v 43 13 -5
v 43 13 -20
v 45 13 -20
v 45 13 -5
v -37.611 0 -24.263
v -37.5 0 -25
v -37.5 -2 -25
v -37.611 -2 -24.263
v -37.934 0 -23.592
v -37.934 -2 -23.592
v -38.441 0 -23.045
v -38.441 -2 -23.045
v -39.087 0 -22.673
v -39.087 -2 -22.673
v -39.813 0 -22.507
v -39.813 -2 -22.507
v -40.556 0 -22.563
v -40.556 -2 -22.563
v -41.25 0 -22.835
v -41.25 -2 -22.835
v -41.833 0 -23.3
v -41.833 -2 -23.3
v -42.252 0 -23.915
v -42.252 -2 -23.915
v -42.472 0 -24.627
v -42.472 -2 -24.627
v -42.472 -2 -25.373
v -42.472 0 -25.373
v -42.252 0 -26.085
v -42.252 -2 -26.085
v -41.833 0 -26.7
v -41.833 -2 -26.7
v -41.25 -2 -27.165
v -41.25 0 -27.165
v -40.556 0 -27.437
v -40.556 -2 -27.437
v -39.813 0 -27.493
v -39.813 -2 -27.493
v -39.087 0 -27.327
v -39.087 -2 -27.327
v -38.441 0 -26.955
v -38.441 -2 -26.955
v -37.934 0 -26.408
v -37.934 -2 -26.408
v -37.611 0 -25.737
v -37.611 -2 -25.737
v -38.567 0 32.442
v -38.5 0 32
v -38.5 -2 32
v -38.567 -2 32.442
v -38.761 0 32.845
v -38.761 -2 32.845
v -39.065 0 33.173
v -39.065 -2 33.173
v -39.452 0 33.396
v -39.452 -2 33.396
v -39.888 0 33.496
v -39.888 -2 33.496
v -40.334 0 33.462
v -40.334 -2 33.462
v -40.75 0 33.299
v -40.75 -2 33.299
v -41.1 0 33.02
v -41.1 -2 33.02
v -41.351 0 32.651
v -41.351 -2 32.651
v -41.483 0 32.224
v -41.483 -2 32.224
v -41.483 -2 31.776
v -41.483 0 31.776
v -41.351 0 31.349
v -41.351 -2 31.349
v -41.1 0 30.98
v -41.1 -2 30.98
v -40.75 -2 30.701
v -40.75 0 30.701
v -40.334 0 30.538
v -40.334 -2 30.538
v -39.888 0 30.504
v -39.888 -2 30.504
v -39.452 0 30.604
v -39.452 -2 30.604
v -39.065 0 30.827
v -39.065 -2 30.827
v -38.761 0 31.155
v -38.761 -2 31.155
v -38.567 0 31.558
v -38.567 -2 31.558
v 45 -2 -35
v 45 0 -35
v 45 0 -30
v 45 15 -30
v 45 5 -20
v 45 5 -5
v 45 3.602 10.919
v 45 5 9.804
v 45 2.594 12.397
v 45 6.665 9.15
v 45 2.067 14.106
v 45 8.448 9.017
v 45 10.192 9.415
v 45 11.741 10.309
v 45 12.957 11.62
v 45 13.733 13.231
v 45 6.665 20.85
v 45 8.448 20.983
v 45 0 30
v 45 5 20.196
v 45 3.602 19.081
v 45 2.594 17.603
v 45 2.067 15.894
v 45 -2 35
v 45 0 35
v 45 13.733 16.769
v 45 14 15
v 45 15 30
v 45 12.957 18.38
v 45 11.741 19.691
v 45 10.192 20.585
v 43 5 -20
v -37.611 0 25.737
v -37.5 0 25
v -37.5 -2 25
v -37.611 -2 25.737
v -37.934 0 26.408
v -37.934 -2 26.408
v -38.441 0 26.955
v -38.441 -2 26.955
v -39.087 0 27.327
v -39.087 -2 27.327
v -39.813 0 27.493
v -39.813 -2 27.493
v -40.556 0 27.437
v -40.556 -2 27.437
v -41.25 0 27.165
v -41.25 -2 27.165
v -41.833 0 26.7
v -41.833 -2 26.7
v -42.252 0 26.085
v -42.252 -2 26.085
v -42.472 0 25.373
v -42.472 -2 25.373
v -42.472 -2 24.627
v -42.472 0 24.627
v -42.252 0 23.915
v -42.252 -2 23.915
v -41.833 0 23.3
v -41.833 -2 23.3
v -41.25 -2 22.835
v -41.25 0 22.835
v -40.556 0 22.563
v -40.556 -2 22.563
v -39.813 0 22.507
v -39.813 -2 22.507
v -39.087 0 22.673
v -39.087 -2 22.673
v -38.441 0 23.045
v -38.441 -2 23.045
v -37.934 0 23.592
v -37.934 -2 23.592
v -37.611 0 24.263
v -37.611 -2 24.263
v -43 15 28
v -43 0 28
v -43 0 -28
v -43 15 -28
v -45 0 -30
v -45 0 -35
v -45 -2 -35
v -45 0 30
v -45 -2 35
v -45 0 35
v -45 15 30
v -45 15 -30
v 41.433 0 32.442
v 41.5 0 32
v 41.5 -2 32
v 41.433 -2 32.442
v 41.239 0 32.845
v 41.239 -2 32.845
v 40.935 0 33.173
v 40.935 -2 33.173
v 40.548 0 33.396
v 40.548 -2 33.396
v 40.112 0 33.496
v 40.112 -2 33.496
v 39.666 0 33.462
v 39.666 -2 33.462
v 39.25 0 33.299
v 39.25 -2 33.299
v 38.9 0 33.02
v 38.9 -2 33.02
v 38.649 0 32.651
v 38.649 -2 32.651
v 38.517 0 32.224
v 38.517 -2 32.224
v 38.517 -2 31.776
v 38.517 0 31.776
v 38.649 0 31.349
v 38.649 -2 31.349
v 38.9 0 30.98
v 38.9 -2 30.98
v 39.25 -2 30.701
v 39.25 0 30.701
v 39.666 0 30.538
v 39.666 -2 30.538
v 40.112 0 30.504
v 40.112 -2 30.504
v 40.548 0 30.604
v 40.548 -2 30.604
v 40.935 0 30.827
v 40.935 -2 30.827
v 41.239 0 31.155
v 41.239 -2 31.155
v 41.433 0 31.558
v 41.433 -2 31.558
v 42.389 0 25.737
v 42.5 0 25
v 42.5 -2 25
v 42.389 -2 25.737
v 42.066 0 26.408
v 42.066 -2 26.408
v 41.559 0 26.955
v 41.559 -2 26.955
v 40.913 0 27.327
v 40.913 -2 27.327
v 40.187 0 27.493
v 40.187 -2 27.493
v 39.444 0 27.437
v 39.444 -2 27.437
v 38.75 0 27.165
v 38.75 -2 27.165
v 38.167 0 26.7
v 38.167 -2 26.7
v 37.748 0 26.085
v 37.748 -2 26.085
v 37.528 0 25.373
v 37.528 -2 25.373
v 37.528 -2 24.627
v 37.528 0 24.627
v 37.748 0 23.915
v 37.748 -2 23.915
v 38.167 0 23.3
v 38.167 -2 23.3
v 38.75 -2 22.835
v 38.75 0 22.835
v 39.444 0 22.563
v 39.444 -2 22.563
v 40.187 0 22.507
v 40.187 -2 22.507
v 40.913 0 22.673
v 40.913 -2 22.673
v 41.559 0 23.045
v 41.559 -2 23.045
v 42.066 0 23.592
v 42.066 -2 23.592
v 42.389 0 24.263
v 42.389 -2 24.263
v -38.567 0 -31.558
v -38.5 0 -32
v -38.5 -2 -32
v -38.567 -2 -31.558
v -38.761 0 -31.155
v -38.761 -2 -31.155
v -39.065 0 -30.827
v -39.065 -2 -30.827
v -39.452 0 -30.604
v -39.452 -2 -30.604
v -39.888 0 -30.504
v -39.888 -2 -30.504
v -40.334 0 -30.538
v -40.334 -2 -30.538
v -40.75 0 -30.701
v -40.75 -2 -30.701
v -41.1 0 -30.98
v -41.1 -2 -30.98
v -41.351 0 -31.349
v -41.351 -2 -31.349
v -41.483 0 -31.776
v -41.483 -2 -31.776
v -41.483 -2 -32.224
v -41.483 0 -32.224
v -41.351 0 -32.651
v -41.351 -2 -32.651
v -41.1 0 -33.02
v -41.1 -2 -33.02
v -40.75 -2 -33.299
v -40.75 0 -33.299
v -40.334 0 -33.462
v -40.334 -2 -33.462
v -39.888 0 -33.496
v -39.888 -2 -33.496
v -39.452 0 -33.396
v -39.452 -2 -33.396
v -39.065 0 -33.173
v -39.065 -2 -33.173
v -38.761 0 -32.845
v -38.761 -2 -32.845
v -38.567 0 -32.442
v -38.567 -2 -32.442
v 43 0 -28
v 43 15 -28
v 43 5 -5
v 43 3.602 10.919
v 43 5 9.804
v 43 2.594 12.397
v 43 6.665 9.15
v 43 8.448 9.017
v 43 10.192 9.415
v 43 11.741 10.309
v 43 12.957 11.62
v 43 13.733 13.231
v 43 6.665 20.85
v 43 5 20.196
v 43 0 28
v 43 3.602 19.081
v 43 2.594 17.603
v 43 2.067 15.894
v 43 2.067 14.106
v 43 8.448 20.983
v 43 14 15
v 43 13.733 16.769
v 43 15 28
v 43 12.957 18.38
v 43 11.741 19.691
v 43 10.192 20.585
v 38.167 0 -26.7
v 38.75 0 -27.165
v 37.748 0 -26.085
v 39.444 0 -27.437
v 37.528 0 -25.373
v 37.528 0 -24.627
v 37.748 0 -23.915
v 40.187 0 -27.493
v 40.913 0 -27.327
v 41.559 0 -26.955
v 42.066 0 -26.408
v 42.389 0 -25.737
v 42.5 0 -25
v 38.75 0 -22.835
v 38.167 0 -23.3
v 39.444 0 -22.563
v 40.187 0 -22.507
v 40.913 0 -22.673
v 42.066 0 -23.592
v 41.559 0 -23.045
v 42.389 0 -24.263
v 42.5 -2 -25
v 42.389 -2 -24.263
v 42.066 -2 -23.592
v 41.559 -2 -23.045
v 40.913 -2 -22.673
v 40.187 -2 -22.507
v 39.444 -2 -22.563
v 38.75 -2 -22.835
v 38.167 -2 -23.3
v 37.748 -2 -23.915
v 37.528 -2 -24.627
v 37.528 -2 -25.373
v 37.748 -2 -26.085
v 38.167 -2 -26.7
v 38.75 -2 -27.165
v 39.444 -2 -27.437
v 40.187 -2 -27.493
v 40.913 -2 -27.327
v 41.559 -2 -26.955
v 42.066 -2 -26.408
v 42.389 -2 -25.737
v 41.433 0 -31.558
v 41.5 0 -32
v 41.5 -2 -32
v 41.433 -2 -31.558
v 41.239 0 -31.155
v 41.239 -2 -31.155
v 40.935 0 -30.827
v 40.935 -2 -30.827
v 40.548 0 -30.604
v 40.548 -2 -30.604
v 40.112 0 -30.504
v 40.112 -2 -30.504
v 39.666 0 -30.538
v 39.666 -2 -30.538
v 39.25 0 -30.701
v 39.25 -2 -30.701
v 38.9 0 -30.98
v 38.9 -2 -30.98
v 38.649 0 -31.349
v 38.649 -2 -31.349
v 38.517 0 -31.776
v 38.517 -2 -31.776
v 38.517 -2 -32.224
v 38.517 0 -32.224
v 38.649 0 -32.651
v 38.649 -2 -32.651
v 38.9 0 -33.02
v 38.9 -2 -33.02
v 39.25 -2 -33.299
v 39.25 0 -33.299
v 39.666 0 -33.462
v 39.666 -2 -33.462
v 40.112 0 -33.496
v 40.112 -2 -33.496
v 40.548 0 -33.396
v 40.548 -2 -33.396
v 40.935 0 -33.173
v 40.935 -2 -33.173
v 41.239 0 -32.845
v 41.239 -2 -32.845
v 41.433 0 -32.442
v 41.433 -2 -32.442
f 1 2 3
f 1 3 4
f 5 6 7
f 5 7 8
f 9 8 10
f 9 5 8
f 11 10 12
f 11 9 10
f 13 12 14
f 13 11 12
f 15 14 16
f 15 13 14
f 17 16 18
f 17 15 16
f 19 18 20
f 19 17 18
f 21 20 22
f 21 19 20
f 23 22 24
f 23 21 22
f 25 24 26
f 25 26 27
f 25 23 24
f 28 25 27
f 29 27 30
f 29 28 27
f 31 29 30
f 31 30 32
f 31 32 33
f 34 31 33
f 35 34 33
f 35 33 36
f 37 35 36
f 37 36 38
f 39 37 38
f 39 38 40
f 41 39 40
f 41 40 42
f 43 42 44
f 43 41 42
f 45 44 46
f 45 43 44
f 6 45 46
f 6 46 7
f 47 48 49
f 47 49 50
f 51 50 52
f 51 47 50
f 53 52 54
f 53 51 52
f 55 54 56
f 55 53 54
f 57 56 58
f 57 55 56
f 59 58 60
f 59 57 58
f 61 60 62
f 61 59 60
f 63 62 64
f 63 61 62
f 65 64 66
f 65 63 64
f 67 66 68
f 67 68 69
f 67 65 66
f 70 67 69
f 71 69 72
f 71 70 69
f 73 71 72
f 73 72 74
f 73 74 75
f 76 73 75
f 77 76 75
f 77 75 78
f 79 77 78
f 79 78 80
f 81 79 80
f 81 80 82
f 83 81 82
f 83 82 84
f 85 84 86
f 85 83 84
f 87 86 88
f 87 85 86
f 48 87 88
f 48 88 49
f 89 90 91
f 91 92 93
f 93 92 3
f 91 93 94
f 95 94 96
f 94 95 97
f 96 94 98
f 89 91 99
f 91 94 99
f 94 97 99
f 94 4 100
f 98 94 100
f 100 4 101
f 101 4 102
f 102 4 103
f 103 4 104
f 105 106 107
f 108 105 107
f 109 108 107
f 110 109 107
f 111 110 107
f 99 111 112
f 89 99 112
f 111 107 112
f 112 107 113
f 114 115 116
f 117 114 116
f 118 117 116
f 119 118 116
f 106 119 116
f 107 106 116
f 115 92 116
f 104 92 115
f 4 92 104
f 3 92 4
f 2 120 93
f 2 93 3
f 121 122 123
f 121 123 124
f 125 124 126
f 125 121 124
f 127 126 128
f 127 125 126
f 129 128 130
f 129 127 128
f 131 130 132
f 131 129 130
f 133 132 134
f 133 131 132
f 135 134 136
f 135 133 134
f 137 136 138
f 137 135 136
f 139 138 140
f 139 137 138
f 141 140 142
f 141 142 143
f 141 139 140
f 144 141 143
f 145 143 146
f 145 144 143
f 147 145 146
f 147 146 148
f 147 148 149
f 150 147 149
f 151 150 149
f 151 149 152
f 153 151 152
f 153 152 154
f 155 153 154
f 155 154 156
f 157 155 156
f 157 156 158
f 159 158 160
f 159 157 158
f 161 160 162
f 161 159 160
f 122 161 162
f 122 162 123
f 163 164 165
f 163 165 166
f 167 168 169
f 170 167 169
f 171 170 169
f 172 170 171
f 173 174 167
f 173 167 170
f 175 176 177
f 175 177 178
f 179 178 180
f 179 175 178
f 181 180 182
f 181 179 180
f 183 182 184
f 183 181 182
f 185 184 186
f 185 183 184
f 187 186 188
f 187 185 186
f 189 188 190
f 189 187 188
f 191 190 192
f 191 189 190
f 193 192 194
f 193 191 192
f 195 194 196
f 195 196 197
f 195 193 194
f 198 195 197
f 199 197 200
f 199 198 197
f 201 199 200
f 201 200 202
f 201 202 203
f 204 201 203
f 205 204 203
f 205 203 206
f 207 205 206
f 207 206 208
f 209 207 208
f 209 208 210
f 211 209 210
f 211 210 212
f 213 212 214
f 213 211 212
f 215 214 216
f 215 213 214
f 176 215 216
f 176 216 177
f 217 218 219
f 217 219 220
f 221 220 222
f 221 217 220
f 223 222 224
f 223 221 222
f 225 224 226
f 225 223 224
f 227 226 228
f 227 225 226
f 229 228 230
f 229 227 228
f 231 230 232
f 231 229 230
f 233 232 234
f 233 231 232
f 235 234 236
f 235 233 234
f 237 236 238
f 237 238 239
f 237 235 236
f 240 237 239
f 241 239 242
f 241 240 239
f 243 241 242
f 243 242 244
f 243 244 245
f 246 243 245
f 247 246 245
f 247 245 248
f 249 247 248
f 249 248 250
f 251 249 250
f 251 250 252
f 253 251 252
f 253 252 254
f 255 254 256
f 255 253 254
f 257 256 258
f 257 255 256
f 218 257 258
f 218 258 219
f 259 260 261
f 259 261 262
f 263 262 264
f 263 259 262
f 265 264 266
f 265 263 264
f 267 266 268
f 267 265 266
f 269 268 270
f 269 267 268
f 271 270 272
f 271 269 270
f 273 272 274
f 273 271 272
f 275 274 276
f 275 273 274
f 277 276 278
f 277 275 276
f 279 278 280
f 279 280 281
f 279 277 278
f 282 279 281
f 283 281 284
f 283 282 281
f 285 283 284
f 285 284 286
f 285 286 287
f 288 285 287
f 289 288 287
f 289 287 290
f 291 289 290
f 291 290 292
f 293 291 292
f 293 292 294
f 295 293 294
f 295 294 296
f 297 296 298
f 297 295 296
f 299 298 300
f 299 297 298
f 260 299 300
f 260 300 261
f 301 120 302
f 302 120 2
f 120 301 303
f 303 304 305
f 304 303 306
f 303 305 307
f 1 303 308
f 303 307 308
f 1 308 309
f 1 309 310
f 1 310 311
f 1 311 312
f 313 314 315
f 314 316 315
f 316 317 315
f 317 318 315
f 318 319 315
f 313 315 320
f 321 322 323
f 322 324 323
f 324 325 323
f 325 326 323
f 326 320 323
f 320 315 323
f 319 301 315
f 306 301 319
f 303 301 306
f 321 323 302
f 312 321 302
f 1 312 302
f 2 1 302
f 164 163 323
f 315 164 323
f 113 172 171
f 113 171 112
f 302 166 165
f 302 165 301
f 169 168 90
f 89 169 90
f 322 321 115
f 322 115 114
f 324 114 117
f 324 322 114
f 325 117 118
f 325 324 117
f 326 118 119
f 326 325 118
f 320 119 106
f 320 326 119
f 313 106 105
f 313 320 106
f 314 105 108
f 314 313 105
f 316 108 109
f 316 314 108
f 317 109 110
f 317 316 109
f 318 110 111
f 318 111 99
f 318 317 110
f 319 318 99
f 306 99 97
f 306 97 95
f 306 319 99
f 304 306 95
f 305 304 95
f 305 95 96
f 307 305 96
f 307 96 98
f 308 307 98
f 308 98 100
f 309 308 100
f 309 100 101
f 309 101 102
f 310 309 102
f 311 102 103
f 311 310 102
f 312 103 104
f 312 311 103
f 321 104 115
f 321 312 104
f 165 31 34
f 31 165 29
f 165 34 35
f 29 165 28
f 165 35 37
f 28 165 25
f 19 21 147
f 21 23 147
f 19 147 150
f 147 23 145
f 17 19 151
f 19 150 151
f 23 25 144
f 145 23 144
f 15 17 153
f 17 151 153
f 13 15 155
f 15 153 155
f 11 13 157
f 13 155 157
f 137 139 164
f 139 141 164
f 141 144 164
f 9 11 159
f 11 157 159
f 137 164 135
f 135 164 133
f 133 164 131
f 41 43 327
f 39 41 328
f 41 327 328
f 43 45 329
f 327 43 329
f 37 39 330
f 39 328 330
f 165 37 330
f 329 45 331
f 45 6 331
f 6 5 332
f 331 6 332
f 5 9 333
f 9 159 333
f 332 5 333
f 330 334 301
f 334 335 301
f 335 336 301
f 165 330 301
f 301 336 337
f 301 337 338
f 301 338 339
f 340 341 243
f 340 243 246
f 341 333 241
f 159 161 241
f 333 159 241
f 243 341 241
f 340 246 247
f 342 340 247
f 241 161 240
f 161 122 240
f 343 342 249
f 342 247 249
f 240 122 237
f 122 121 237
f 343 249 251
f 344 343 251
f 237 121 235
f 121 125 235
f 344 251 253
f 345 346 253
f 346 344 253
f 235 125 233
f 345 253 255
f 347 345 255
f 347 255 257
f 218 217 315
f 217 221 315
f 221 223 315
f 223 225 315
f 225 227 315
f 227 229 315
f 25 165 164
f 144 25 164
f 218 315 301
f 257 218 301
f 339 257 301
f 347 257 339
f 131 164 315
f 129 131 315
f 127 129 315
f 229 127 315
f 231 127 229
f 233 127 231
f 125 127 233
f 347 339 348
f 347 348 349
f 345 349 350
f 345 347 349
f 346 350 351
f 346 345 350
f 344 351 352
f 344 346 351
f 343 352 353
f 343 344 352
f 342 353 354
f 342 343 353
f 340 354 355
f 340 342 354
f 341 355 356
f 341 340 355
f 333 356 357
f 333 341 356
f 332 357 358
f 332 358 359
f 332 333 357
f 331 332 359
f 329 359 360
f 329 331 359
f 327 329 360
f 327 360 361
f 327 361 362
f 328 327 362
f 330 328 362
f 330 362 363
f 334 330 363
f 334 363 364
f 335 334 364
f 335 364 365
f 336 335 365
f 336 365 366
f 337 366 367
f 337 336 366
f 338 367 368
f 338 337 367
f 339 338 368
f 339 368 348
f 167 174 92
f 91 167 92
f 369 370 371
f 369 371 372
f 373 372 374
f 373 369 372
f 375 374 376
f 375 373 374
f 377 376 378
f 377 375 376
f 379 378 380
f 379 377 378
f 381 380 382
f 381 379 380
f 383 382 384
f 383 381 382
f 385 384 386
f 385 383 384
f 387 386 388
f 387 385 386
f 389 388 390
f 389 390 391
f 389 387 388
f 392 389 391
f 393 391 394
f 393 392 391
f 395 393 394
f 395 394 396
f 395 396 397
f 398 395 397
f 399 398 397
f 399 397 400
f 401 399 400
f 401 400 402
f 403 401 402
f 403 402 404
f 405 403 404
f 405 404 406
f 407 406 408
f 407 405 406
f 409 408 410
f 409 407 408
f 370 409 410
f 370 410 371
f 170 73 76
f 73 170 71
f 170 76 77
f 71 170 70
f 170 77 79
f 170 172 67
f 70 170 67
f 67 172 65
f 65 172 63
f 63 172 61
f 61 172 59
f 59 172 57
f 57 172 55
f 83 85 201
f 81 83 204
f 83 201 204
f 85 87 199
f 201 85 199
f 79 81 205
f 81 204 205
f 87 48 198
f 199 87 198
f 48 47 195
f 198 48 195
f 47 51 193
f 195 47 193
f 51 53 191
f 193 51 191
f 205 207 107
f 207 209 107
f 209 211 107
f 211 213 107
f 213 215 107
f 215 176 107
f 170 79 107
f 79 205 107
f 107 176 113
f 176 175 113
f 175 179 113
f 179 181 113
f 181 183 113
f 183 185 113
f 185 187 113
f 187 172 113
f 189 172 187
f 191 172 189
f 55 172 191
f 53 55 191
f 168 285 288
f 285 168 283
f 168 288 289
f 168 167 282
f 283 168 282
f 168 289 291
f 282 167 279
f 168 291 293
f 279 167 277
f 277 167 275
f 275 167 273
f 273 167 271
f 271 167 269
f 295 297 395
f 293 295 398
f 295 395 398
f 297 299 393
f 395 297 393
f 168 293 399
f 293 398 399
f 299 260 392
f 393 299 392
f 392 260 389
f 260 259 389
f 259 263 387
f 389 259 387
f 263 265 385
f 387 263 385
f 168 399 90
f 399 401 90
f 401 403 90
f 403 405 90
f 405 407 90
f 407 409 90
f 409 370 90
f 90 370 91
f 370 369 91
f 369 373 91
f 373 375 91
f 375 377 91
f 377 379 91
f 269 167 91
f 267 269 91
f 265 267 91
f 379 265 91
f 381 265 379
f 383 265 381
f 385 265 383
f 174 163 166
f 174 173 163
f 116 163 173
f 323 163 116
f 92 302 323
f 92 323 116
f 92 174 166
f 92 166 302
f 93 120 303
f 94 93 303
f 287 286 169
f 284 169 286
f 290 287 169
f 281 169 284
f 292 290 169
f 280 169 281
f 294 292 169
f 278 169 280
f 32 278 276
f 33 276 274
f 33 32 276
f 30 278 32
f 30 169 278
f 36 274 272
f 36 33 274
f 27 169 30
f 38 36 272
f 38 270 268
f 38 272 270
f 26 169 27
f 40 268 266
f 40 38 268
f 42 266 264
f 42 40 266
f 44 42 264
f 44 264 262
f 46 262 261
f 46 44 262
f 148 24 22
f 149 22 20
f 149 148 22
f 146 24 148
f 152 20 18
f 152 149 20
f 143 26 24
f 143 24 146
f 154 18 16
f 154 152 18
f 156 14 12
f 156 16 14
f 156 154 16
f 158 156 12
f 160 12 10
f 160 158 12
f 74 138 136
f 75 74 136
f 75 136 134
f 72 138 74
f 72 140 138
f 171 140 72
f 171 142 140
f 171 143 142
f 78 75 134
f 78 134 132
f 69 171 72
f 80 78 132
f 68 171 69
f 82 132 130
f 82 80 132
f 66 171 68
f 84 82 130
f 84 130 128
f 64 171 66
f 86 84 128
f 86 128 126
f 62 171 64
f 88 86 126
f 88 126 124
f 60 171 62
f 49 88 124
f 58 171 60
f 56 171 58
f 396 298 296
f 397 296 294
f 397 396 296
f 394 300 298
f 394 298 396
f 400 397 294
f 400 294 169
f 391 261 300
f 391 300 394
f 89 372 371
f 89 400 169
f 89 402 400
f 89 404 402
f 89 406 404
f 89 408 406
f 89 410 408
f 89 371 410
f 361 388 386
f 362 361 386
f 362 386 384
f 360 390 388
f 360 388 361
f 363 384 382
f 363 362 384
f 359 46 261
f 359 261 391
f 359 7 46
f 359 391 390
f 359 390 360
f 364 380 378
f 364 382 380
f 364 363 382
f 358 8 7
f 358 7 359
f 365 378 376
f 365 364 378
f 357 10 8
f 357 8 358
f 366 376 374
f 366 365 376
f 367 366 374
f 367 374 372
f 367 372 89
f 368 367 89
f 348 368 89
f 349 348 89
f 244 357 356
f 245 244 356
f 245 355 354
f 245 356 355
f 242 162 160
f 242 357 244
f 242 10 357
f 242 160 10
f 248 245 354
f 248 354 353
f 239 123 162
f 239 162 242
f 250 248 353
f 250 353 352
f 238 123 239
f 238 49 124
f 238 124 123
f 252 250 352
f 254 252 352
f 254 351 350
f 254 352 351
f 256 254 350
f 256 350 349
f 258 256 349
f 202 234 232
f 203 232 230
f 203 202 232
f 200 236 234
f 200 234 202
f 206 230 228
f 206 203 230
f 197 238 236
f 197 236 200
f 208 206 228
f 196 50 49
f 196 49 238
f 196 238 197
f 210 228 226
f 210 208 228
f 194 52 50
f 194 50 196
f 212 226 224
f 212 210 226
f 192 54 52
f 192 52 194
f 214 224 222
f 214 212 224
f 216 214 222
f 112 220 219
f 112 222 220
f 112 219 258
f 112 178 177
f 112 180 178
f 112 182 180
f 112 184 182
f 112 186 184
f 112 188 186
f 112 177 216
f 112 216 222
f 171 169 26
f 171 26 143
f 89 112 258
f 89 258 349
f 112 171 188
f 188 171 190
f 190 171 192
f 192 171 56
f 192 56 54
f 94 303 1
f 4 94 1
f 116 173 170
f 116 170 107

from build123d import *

# Parameters (mm, degrees)
SKETCH004_W   = 15
SKETCH004_H   = 60
SKETCH004_R   = 6
SKETCH004_W_2 = 8
SKETCH004_H_2 = 15
PAD004_DEPTH  = 2
SKETCH003_W   = 15
SKETCH003_H   = 60
PAD003_DEPTH  = 2
SKETCH002_W   = 90
SKETCH002_H   = 15
PAD002_DEPTH  = 2
SKETCH001_W   = 90
SKETCH001_H   = 15
PAD001_DEPTH  = 2
SKETCH_W      = 90
SKETCH_H      = 70
SKETCH_R      = 2.5
SKETCH_R_2    = 1.5
PAD_DEPTH     = 2


with BuildPart() as body004:
    # Sketch004 → Pad004 (new body)
    with BuildSketch(Plane.YZ):
        with Locations((7.5, 0)):
            Rectangle(SKETCH004_W, SKETCH004_H)
        with Locations((8, 15)):
            Circle(SKETCH004_R, mode=Mode.SUBTRACT)
        with Locations((9, -12.5)):
            Rectangle(SKETCH004_W_2, SKETCH004_H_2, mode=Mode.SUBTRACT)
    extrude(amount=PAD004_DEPTH)


with BuildPart() as body004_1:
    # Body004 placement: moved
    add(body004.part.moved(Location((43, 0, 0))))


with BuildPart() as body003:
    # Sketch003 → Pad003 (new body)
    with BuildSketch(Plane.YZ):
        with Locations((7.5, 0)):
            Rectangle(SKETCH003_W, SKETCH003_H)
    extrude(amount=PAD003_DEPTH)


with BuildPart() as body003_1:
    # Body003 placement: moved
    add(body003.part.moved(Location((-45, 0, 0))))


with BuildPart() as body002:
    # Sketch002 → Pad002 (new body)
    with BuildSketch(Plane.XY):
        with Locations((0, 7.5)):
            Rectangle(SKETCH002_W, SKETCH002_H)
    extrude(amount=PAD002_DEPTH)


with BuildPart() as body002_1:
    # Body002 placement: moved
    add(body002.part.moved(Location((0, 0, -30))))


with BuildPart() as body001:
    # Sketch001 → Pad001 (new body)
    with BuildSketch(Plane.XY):
        with Locations((0, 7.5)):
            Rectangle(SKETCH001_W, SKETCH001_H)
    extrude(amount=PAD001_DEPTH)


with BuildPart() as body001_1:
    # Body001 placement: moved
    add(body001.part.moved(Location((0, 0, 28))))


with BuildPart() as fusion003:
    # Sketch → Pad (new body)
    with BuildSketch(Plane.XZ):
        Rectangle(SKETCH_W, SKETCH_H)
        with Locations((-40, 25)):
            Circle(SKETCH_R, mode=Mode.SUBTRACT)
        with Locations((-40, -25)):
            Circle(SKETCH_R, mode=Mode.SUBTRACT)
        with Locations((40, -25)):
            Circle(SKETCH_R, mode=Mode.SUBTRACT)
        with Locations((40, 25)):
            Circle(SKETCH_R, mode=Mode.SUBTRACT)
        with Locations((-40, 32)):
            Circle(SKETCH_R_2, mode=Mode.SUBTRACT)
        with Locations((40, 32)):
            Circle(SKETCH_R_2, mode=Mode.SUBTRACT)
        with Locations((40, -32)):
            Circle(SKETCH_R_2, mode=Mode.SUBTRACT)
        with Locations((-40, -32)):
            Circle(SKETCH_R_2, mode=Mode.SUBTRACT)
    extrude(amount=PAD_DEPTH)

    # Fusion: union Body001
    add(body001_1.part)

    # Fusion001: union Body002
    add(body002_1.part)

    # Fusion002: union Body003
    add(body003_1.part)

    # Fusion003: union Body004
    add(body004_1.part)


solid = fusion003.part
